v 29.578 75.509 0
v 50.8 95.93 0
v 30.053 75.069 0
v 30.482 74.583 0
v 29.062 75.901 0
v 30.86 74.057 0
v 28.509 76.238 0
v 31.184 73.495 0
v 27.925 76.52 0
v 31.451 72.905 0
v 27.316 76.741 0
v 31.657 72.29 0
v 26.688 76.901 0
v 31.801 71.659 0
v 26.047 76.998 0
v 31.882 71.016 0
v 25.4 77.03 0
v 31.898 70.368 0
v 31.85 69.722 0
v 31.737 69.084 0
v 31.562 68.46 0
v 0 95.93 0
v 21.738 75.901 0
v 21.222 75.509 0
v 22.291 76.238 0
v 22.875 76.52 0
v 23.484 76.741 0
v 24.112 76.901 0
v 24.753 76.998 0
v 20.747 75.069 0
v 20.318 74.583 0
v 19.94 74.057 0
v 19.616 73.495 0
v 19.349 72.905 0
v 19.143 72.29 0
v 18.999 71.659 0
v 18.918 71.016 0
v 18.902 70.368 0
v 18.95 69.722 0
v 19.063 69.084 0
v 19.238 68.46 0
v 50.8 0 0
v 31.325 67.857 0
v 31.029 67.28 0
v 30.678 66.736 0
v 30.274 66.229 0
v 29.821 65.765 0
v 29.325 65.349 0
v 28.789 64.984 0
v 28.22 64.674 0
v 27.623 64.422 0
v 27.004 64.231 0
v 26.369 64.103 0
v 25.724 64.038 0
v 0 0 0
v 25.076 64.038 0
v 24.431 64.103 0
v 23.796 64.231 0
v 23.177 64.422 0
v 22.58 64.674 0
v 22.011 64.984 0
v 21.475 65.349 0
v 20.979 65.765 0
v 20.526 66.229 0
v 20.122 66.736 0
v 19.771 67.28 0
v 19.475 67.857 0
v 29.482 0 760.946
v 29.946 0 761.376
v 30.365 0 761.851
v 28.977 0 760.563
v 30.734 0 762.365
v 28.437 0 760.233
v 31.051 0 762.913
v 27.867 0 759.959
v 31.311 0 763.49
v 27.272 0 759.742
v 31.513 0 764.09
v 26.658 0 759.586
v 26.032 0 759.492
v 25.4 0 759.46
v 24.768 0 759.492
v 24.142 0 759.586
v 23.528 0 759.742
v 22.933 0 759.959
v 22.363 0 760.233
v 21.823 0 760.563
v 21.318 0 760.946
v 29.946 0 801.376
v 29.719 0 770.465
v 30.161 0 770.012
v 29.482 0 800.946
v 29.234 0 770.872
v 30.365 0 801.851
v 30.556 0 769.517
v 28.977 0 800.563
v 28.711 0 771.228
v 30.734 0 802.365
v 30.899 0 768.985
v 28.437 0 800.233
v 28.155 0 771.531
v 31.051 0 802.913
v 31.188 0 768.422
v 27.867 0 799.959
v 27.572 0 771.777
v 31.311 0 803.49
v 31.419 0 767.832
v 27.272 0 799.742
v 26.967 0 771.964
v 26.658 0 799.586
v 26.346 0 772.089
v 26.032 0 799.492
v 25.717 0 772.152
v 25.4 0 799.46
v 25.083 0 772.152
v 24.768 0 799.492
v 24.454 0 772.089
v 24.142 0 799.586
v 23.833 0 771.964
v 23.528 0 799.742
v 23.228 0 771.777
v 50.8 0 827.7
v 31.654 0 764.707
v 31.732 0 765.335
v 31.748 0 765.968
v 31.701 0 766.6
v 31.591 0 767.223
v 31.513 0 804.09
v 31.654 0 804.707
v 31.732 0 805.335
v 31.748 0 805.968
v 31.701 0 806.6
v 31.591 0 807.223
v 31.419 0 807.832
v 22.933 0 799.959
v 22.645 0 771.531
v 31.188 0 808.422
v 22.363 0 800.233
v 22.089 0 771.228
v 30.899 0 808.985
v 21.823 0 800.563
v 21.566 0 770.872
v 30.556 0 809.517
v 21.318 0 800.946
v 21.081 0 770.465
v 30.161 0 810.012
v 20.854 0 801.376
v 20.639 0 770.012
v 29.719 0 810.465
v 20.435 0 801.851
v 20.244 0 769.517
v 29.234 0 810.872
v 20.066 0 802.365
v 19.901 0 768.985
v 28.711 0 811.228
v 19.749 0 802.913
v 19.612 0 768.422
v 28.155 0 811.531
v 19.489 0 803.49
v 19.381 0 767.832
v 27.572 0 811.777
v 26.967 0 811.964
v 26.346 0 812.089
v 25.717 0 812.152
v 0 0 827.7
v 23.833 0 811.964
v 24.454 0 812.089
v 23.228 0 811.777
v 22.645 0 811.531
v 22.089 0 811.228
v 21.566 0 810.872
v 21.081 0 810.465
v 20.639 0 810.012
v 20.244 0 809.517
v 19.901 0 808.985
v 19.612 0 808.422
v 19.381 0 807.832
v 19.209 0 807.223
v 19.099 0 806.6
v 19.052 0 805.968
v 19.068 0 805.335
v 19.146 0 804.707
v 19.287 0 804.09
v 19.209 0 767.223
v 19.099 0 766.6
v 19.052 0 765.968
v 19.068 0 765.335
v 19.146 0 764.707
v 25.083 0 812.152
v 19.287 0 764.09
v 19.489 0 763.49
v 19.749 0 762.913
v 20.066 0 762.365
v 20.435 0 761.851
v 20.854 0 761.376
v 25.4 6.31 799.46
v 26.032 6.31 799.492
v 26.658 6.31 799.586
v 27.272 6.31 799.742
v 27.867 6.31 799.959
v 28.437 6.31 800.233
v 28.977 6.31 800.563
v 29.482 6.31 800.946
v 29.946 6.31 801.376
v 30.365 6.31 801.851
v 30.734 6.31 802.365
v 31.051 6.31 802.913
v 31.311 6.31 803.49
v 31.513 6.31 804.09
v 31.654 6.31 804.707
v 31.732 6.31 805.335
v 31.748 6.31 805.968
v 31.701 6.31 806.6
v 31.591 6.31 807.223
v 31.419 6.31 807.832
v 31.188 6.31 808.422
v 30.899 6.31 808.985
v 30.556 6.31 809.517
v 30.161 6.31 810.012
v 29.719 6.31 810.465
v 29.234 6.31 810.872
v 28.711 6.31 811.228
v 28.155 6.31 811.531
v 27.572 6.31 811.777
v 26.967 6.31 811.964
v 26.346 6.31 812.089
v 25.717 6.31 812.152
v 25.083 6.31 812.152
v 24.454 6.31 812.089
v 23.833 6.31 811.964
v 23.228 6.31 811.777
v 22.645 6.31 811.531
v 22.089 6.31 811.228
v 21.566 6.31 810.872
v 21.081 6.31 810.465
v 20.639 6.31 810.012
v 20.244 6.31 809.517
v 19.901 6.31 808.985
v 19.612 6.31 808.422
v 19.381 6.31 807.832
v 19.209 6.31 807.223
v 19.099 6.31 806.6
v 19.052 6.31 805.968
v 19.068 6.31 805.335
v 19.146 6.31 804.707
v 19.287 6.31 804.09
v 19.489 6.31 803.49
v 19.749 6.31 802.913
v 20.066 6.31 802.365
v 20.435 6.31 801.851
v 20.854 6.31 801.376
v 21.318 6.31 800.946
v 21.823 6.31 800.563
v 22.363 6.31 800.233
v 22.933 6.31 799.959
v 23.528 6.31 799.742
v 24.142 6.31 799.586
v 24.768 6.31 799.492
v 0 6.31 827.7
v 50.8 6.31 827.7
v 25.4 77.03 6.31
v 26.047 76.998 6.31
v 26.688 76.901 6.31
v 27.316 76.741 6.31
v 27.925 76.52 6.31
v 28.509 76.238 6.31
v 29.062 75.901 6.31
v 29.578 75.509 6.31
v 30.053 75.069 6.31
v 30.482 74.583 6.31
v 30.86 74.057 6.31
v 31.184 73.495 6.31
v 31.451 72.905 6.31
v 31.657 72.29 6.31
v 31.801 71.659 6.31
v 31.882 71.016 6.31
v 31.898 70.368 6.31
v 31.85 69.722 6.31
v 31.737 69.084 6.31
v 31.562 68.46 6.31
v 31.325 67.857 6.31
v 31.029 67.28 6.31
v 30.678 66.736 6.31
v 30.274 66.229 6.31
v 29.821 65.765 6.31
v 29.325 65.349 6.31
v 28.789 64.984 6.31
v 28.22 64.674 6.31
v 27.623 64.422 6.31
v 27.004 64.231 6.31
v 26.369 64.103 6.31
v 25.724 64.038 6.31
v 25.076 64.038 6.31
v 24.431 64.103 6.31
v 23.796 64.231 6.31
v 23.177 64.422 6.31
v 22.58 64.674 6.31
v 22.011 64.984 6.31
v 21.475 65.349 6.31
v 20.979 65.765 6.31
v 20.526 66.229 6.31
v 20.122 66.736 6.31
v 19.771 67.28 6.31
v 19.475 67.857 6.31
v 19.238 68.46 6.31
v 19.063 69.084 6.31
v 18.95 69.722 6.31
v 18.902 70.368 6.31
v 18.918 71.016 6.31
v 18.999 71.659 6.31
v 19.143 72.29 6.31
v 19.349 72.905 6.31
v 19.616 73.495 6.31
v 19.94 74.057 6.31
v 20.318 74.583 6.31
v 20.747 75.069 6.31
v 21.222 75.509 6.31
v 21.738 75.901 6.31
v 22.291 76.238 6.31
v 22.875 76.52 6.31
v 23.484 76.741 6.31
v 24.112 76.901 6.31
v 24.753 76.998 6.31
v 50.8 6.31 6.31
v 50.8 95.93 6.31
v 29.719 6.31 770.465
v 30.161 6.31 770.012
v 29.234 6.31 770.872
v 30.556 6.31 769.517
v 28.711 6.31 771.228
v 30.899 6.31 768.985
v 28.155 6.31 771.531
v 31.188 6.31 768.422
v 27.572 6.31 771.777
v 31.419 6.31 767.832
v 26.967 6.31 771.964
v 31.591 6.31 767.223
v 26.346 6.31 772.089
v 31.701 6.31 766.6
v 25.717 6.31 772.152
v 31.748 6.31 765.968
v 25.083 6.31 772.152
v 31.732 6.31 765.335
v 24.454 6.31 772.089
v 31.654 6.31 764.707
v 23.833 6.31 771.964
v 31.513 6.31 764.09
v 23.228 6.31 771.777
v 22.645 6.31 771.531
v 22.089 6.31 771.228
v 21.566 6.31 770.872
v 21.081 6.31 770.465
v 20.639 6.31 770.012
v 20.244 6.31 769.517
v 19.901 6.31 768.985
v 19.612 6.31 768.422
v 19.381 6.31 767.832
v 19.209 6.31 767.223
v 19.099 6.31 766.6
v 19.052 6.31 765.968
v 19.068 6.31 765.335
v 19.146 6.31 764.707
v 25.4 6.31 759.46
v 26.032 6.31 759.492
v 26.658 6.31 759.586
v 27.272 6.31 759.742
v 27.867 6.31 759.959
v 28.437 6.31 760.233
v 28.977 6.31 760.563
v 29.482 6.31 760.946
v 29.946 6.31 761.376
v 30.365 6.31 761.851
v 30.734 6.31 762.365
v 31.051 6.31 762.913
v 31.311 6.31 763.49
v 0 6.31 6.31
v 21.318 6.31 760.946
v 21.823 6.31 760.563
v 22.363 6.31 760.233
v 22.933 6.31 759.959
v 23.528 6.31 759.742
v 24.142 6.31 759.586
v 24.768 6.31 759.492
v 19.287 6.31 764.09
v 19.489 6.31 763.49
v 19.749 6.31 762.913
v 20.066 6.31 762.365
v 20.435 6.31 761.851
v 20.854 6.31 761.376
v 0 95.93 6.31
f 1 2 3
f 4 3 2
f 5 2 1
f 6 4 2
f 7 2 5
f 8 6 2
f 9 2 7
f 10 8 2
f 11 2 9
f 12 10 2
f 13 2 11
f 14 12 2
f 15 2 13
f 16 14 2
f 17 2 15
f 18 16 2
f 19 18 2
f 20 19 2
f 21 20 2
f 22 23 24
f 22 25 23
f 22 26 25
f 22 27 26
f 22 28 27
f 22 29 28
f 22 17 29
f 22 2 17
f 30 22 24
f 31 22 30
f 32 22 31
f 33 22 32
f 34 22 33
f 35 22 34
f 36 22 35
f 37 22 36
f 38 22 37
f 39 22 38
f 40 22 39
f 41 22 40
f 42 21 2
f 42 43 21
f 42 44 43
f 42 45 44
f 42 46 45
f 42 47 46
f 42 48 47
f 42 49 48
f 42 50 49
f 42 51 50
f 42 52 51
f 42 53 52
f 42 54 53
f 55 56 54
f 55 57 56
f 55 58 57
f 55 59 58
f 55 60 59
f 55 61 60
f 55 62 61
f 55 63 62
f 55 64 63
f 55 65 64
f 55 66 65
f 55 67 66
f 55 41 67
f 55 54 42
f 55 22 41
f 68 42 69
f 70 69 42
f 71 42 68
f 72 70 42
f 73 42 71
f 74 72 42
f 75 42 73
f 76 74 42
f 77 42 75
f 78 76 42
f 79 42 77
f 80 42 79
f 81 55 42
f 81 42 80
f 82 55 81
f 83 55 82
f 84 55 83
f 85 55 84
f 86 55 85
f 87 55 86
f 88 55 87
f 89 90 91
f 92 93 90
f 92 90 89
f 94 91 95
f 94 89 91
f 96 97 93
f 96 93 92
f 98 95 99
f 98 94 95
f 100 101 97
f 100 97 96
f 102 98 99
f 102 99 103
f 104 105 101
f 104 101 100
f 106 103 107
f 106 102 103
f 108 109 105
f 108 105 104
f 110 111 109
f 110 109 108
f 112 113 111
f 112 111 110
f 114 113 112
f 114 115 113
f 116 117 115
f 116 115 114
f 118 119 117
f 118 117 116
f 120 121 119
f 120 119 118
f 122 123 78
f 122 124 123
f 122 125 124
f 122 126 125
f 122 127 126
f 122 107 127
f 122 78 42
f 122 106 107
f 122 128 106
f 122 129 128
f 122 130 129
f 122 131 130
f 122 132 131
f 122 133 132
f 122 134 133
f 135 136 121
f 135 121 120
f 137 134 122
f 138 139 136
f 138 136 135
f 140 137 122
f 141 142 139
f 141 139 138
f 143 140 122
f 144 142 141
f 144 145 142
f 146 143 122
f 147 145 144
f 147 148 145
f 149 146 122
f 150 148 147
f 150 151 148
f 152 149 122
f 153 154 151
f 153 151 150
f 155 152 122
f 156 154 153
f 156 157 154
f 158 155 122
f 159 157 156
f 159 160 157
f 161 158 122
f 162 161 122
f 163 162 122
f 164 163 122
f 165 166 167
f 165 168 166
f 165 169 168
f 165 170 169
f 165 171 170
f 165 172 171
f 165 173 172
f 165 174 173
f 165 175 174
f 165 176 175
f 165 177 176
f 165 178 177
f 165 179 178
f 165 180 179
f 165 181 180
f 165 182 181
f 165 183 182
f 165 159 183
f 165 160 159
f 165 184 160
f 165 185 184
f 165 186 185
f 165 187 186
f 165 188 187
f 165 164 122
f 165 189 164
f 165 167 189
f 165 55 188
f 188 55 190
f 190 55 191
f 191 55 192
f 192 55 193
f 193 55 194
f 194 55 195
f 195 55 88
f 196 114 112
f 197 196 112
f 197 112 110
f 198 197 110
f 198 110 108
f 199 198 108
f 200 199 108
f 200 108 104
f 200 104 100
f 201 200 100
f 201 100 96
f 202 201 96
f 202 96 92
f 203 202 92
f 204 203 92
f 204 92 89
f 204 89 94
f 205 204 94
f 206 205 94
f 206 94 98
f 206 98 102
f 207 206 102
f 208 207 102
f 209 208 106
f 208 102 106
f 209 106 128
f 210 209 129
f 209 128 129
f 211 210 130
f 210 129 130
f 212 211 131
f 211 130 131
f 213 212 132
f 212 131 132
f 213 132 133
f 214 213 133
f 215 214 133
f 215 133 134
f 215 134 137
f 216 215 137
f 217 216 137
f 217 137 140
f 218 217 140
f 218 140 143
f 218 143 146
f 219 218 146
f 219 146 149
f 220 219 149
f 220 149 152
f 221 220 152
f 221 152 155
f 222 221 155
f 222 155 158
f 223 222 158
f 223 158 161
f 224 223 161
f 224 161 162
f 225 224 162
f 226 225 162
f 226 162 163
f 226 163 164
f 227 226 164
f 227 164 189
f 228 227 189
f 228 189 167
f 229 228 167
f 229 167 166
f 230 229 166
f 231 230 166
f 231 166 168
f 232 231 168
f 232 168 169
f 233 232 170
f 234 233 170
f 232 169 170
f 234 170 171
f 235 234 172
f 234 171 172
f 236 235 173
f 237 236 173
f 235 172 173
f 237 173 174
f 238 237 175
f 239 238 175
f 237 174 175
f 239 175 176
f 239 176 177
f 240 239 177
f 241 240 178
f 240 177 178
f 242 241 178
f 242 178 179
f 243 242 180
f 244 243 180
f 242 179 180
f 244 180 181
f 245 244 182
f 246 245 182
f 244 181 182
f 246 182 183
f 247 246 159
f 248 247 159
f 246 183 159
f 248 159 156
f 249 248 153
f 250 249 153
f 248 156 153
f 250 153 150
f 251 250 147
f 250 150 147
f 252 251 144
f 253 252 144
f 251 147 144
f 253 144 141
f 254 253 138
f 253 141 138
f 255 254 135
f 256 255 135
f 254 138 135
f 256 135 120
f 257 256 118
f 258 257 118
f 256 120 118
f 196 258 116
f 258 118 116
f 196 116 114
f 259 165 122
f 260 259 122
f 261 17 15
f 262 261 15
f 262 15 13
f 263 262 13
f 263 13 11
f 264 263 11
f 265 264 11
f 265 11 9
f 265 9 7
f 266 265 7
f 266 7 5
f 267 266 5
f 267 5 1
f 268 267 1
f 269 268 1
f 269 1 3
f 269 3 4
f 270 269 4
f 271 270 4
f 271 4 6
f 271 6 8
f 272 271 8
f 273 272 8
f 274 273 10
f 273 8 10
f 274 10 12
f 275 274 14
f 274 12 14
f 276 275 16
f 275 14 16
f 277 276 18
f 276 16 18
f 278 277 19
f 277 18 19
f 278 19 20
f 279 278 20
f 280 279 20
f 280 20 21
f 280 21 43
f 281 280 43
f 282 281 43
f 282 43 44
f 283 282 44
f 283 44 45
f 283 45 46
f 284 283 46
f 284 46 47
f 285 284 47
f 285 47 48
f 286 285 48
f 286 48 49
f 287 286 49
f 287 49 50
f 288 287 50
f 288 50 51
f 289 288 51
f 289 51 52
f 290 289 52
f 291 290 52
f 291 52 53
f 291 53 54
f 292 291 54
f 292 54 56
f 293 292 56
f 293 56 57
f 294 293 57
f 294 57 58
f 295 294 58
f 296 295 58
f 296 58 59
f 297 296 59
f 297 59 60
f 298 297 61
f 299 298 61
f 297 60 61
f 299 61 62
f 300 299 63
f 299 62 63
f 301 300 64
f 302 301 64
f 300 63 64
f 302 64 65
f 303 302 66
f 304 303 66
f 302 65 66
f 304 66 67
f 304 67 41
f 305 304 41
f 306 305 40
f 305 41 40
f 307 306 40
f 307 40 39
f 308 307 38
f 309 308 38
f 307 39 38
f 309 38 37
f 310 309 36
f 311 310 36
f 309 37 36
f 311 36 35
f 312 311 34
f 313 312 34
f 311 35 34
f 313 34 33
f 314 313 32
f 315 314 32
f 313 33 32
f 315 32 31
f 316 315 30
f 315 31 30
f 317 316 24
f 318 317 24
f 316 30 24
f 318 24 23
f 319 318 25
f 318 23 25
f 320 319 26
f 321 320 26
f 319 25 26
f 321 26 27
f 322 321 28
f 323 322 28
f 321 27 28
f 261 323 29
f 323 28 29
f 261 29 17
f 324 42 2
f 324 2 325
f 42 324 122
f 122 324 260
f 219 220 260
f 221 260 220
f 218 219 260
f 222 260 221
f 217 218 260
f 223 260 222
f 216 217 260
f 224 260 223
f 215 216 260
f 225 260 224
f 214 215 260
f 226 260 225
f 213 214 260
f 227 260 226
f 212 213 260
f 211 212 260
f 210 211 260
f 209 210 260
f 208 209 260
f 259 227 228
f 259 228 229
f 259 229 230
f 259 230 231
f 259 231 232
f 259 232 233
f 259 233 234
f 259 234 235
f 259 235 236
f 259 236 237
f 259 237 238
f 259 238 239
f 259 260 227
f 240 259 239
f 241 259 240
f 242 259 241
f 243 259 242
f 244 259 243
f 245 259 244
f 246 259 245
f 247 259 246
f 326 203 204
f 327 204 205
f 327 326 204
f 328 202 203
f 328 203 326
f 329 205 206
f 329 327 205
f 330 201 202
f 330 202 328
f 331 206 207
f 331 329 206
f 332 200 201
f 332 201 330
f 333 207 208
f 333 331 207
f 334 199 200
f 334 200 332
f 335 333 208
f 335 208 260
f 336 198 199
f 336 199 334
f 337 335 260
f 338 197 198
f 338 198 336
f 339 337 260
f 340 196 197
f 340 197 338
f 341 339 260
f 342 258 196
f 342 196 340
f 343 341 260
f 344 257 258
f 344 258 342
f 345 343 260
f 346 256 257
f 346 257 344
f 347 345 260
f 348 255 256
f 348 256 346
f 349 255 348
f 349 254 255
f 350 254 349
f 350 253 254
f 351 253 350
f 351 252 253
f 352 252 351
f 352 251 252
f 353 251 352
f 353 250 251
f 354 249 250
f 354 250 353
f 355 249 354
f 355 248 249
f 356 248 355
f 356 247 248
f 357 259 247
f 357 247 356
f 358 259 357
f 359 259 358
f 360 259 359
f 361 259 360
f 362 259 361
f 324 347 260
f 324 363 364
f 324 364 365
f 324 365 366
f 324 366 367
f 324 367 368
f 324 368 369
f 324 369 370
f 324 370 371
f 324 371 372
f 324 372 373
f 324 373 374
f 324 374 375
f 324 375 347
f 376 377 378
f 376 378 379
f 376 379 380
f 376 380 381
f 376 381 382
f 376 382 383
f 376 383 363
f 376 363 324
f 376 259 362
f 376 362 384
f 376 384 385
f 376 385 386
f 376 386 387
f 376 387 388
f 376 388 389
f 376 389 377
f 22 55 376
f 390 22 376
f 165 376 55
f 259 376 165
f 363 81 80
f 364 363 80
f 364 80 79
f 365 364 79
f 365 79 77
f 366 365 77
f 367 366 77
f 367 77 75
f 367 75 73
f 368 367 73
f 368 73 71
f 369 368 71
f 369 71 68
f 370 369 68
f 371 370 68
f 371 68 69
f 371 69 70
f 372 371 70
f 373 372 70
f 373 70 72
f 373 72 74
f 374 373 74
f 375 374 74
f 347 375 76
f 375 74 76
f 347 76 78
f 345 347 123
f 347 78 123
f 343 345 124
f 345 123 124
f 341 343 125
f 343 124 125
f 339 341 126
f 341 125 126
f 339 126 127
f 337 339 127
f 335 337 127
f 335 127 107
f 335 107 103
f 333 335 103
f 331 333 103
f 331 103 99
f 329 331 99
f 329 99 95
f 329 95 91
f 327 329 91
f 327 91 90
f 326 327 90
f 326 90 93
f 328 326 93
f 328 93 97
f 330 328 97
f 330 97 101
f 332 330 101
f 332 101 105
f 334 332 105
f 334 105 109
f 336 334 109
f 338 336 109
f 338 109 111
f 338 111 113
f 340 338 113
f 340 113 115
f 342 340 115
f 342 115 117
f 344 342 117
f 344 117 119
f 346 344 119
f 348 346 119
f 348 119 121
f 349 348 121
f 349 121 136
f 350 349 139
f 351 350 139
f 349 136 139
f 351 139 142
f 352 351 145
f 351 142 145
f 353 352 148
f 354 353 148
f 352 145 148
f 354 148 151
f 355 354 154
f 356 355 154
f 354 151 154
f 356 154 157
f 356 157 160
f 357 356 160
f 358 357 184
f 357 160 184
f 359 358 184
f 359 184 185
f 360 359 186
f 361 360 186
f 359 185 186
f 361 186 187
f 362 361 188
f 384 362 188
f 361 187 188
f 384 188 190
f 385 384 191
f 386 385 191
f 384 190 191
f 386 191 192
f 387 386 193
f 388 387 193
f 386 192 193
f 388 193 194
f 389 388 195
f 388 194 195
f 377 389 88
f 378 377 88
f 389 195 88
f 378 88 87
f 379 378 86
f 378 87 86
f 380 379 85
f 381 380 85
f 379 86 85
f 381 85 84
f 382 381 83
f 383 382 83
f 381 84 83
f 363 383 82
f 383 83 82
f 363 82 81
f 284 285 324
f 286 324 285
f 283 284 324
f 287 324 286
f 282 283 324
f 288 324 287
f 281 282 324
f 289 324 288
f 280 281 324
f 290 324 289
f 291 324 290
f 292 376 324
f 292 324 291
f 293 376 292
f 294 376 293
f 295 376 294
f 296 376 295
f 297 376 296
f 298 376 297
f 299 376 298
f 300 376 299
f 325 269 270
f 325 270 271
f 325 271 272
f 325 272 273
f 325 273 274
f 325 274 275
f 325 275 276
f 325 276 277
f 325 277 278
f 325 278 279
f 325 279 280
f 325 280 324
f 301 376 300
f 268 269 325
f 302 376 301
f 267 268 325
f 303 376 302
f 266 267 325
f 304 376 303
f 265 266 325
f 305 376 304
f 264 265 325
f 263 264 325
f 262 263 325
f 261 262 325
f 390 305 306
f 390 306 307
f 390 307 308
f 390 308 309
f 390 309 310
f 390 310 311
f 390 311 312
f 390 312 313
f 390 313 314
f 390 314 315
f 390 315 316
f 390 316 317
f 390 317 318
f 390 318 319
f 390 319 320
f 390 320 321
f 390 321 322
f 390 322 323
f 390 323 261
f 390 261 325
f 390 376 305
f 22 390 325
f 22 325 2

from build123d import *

# Parameters (mm, degrees)
SALIENTE_EXTRUIR1_DEPTH = 50.8
CROQUIS2_R              = 6.5
CORTAR_EXTRUIR1_DEPTH   = 10
CROQUIS3_R              = 6.5
CORTAR_EXTRUIR2_DEPTH   = 10
CROQUIS4_W              = 50.8
CROQUIS4_H              = 74.5
CORTAR_EXTRUIR3_DEPTH   = 10
CROQUIS5_R              = 6.35
CORTAR_EXTRUIR4_DEPTH   = 10


with BuildPart() as part:
    # Croquis1 → Saliente-Extruir1 (new body)
    with BuildSketch(Plane(origin=(0, 0, 0), x_dir=(0, 0, -1), z_dir=(1, 0, 0))):
        Polygon((-6.31, 95.93), (0, 95.93), (0, 0), (-902.2, 0), (-902.2, 6.31), (-6.31, 6.31), align=None)
    extrude(amount=SALIENTE_EXTRUIR1_DEPTH)

    # Croquis2 → Cortar-Extruir1 (cut)
    with BuildSketch(Plane(origin=(0, 0, 0), x_dir=(-1, 0, 0), z_dir=(0, -1, 0))):
        with Locations(Location((-25.4, -885.7, 0), (0, 0, 90))):
            Circle(CROQUIS2_R)
        with Locations(Location((-25.4, -854.7, 0), (0, 0, 90))):
            Circle(CROQUIS2_R)
    extrude(amount=-CORTAR_EXTRUIR1_DEPTH, mode=Mode.SUBTRACT)

    # Croquis3 → Cortar-Extruir2 (cut)
    with BuildSketch(Plane(origin=(0, 0, 0), x_dir=(-1, 0, 0), z_dir=(0, 0, -1))):
        with Locations(Location((-25.4, 70.53, 0), (0, 0, 90))):
            Circle(CROQUIS3_R)
    extrude(amount=-CORTAR_EXTRUIR2_DEPTH, mode=Mode.SUBTRACT)

    # Croquis4 → Cortar-Extruir3 (cut)
    with BuildSketch(Plane.XZ):
        with Locations((25.4, 864.95)):
            Rectangle(CROQUIS4_W, CROQUIS4_H)
    extrude(amount=-CORTAR_EXTRUIR3_DEPTH, mode=Mode.SUBTRACT)

    # Croquis5 → Cortar-Extruir4 (cut)
    with BuildSketch(Plane(origin=(0, 0, 0), x_dir=(-1, 0, 0), z_dir=(0, -1, 0))):
        with Locations(Location((-25.4, -765.81, 0), (0, 0, 90))):
            Circle(CROQUIS5_R)
        with Locations(Location((-25.4, -805.81, 0), (0, 0, 90))):
            Circle(CROQUIS5_R)
    extrude(amount=-CORTAR_EXTRUIR4_DEPTH, mode=Mode.SUBTRACT)


solid = part.part
